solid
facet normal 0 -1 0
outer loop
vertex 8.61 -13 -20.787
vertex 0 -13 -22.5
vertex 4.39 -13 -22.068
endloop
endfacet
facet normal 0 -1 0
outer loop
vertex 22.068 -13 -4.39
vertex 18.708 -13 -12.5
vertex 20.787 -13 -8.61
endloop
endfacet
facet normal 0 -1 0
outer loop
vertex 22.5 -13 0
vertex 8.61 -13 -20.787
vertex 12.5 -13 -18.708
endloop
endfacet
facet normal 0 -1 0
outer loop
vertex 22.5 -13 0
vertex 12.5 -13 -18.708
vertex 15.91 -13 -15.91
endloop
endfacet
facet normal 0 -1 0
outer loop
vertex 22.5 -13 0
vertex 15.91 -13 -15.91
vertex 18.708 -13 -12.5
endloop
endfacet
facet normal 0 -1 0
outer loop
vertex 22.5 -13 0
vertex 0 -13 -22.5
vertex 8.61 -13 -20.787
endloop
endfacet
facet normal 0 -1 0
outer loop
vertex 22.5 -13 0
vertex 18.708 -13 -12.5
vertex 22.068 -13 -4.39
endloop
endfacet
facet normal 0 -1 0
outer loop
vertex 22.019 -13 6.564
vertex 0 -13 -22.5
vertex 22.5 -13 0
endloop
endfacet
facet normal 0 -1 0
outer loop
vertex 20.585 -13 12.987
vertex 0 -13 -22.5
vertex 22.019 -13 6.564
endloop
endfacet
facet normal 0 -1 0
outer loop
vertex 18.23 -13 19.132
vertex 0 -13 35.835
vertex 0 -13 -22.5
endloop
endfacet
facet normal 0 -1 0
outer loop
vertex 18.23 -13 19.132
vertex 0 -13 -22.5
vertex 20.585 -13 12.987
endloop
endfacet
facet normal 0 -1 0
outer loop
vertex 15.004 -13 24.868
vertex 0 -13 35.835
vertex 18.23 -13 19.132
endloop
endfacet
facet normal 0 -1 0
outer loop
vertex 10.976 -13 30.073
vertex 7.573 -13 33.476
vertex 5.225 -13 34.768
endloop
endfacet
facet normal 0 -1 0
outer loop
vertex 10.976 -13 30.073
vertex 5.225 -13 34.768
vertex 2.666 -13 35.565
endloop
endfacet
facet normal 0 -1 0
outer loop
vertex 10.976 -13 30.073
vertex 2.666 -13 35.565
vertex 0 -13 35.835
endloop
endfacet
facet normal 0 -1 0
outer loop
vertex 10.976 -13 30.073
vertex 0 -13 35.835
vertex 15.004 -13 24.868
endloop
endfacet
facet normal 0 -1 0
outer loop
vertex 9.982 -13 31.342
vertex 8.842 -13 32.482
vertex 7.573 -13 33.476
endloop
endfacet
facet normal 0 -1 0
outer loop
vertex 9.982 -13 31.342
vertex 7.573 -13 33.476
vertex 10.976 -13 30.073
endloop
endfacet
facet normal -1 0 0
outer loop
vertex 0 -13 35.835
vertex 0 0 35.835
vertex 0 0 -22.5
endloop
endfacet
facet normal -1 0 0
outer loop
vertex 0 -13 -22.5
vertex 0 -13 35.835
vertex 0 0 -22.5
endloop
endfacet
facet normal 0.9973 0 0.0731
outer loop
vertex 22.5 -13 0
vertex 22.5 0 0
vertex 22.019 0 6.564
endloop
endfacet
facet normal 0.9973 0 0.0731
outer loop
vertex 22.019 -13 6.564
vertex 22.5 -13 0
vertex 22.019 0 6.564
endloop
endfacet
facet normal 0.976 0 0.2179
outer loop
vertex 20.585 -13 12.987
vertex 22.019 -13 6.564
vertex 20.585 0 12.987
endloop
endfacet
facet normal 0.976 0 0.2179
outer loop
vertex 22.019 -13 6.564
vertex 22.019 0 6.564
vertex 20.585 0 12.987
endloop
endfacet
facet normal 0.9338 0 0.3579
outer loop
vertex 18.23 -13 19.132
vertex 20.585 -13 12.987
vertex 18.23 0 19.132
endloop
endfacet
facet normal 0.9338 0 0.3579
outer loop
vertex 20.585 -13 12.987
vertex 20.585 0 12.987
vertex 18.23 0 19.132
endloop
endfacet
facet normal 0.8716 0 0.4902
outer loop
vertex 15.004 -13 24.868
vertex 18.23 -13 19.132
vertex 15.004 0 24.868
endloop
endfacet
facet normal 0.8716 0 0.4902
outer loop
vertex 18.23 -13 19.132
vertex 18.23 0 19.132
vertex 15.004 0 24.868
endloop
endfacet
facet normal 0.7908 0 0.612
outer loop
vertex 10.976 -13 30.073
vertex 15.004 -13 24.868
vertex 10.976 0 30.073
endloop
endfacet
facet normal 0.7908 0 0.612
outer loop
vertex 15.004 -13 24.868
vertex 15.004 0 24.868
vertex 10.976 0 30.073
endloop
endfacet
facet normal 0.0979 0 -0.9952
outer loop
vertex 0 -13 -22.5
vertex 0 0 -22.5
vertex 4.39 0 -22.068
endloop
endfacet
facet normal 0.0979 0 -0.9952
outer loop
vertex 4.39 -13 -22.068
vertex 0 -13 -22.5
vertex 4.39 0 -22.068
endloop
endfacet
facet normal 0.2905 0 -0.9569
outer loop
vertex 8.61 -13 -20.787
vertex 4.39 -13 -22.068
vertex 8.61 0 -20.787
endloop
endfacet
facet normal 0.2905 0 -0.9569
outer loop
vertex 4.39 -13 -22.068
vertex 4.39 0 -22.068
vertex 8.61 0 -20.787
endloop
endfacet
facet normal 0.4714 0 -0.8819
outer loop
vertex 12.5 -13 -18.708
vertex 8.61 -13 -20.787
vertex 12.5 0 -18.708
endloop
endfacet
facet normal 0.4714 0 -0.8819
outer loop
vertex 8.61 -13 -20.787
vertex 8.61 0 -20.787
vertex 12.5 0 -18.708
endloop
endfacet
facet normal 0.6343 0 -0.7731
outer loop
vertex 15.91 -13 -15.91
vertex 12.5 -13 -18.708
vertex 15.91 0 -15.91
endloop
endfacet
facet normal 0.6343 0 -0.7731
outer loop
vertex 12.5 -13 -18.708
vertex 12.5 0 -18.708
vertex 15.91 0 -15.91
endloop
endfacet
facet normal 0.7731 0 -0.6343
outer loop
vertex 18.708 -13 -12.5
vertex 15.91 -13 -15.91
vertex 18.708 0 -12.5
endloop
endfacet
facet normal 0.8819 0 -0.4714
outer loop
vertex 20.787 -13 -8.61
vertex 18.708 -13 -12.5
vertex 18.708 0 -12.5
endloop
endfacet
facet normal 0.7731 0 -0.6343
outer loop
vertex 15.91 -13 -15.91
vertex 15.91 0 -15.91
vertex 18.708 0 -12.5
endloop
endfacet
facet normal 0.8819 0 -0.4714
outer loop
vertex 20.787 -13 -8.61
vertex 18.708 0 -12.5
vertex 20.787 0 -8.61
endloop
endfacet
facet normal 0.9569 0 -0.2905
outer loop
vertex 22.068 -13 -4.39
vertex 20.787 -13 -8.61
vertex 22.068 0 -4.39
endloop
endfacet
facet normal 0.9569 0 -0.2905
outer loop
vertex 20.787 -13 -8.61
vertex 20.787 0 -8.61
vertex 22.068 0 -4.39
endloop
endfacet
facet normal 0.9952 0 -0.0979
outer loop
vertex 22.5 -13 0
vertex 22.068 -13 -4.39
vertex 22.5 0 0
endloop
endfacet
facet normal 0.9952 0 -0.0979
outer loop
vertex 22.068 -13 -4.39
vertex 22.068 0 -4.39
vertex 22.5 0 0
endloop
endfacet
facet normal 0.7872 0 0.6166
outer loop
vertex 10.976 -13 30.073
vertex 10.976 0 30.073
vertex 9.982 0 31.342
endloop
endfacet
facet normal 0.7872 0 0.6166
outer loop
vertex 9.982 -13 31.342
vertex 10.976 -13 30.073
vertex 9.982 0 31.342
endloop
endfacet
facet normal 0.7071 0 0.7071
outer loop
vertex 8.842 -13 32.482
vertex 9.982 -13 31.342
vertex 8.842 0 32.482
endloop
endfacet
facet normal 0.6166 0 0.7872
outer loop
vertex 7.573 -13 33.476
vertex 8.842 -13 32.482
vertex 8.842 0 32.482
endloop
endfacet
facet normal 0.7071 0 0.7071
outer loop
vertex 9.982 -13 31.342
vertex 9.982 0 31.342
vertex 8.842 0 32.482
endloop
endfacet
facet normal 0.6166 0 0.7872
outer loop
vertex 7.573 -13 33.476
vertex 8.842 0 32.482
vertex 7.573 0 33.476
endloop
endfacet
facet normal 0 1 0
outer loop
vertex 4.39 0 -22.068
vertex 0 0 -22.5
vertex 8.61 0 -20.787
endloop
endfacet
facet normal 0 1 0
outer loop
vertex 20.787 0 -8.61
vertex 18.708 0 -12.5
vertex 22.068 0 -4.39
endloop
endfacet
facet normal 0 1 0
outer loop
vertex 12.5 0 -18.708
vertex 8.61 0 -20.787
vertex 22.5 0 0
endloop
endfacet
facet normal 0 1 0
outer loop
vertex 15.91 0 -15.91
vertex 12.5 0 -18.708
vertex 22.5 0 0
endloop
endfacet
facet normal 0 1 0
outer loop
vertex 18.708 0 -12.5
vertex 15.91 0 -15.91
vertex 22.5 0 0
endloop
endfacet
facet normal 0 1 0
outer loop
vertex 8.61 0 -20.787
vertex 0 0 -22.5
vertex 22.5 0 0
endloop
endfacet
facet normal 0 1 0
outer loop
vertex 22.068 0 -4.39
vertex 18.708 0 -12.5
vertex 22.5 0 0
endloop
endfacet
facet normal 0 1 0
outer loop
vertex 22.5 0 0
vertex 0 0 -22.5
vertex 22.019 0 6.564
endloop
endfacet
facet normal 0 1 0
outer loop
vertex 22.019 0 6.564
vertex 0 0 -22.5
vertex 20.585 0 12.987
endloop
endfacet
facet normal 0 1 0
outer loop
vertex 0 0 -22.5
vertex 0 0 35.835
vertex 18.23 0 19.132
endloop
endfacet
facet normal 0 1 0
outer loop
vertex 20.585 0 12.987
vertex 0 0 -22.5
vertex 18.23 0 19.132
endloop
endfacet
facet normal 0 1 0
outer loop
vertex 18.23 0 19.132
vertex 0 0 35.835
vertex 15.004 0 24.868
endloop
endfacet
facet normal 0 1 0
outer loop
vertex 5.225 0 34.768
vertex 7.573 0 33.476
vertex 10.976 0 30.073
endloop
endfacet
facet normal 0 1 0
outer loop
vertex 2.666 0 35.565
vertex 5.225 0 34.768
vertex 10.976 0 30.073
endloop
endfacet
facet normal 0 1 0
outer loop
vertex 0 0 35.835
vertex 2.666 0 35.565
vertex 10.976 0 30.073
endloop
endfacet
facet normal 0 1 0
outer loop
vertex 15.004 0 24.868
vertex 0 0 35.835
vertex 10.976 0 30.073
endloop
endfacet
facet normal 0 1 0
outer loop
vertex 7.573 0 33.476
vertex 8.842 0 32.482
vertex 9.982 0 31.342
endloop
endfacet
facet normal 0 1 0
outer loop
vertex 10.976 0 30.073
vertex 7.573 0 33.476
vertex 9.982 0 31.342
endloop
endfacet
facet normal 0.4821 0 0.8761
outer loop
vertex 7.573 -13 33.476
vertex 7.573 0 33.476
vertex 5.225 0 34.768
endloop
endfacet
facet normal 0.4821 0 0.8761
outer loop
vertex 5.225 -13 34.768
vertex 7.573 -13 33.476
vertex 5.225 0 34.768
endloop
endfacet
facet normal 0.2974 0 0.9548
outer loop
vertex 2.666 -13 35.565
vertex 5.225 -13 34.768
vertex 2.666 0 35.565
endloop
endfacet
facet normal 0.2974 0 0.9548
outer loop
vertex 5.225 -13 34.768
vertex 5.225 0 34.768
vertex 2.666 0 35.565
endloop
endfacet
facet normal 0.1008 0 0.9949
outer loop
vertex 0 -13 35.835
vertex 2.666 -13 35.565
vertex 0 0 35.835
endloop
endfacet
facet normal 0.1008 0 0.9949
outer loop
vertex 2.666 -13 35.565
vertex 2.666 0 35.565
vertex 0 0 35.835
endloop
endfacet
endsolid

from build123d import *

# Parameters (mm, degrees)
F1_DEPTH = 13


with BuildPart() as f1:
    # F0 (on Front) → F1 (new body)
    with BuildSketch(Plane.XZ):
        with BuildLine():
            Line((0, 35.834754), (0, -22.5))
            ThreePointArc((0, -22.5), (15.909903, -15.909903), (22.5, 0))
            ThreePointArc((22.5, 0), (19.52034, 16.102515), (10.975956, 30.072585))
            ThreePointArc((10.975956, 30.072585), (9.319805, 31.819805), (7.572585, 33.475956))
            ThreePointArc((7.572585, 33.475956), (3.965727, 35.231404), (0, 35.834754))
        make_face()
        with BuildLine():
            ThreePointArc((7.572585, 33.475956), (9.319805, 31.819805), (10.975956, 30.072585))
            ThreePointArc((10.975956, 30.072585), (9.429095, 31.929095), (7.572585, 33.475956))
        make_face()
    extrude(amount=F1_DEPTH)


solid = f1.part
